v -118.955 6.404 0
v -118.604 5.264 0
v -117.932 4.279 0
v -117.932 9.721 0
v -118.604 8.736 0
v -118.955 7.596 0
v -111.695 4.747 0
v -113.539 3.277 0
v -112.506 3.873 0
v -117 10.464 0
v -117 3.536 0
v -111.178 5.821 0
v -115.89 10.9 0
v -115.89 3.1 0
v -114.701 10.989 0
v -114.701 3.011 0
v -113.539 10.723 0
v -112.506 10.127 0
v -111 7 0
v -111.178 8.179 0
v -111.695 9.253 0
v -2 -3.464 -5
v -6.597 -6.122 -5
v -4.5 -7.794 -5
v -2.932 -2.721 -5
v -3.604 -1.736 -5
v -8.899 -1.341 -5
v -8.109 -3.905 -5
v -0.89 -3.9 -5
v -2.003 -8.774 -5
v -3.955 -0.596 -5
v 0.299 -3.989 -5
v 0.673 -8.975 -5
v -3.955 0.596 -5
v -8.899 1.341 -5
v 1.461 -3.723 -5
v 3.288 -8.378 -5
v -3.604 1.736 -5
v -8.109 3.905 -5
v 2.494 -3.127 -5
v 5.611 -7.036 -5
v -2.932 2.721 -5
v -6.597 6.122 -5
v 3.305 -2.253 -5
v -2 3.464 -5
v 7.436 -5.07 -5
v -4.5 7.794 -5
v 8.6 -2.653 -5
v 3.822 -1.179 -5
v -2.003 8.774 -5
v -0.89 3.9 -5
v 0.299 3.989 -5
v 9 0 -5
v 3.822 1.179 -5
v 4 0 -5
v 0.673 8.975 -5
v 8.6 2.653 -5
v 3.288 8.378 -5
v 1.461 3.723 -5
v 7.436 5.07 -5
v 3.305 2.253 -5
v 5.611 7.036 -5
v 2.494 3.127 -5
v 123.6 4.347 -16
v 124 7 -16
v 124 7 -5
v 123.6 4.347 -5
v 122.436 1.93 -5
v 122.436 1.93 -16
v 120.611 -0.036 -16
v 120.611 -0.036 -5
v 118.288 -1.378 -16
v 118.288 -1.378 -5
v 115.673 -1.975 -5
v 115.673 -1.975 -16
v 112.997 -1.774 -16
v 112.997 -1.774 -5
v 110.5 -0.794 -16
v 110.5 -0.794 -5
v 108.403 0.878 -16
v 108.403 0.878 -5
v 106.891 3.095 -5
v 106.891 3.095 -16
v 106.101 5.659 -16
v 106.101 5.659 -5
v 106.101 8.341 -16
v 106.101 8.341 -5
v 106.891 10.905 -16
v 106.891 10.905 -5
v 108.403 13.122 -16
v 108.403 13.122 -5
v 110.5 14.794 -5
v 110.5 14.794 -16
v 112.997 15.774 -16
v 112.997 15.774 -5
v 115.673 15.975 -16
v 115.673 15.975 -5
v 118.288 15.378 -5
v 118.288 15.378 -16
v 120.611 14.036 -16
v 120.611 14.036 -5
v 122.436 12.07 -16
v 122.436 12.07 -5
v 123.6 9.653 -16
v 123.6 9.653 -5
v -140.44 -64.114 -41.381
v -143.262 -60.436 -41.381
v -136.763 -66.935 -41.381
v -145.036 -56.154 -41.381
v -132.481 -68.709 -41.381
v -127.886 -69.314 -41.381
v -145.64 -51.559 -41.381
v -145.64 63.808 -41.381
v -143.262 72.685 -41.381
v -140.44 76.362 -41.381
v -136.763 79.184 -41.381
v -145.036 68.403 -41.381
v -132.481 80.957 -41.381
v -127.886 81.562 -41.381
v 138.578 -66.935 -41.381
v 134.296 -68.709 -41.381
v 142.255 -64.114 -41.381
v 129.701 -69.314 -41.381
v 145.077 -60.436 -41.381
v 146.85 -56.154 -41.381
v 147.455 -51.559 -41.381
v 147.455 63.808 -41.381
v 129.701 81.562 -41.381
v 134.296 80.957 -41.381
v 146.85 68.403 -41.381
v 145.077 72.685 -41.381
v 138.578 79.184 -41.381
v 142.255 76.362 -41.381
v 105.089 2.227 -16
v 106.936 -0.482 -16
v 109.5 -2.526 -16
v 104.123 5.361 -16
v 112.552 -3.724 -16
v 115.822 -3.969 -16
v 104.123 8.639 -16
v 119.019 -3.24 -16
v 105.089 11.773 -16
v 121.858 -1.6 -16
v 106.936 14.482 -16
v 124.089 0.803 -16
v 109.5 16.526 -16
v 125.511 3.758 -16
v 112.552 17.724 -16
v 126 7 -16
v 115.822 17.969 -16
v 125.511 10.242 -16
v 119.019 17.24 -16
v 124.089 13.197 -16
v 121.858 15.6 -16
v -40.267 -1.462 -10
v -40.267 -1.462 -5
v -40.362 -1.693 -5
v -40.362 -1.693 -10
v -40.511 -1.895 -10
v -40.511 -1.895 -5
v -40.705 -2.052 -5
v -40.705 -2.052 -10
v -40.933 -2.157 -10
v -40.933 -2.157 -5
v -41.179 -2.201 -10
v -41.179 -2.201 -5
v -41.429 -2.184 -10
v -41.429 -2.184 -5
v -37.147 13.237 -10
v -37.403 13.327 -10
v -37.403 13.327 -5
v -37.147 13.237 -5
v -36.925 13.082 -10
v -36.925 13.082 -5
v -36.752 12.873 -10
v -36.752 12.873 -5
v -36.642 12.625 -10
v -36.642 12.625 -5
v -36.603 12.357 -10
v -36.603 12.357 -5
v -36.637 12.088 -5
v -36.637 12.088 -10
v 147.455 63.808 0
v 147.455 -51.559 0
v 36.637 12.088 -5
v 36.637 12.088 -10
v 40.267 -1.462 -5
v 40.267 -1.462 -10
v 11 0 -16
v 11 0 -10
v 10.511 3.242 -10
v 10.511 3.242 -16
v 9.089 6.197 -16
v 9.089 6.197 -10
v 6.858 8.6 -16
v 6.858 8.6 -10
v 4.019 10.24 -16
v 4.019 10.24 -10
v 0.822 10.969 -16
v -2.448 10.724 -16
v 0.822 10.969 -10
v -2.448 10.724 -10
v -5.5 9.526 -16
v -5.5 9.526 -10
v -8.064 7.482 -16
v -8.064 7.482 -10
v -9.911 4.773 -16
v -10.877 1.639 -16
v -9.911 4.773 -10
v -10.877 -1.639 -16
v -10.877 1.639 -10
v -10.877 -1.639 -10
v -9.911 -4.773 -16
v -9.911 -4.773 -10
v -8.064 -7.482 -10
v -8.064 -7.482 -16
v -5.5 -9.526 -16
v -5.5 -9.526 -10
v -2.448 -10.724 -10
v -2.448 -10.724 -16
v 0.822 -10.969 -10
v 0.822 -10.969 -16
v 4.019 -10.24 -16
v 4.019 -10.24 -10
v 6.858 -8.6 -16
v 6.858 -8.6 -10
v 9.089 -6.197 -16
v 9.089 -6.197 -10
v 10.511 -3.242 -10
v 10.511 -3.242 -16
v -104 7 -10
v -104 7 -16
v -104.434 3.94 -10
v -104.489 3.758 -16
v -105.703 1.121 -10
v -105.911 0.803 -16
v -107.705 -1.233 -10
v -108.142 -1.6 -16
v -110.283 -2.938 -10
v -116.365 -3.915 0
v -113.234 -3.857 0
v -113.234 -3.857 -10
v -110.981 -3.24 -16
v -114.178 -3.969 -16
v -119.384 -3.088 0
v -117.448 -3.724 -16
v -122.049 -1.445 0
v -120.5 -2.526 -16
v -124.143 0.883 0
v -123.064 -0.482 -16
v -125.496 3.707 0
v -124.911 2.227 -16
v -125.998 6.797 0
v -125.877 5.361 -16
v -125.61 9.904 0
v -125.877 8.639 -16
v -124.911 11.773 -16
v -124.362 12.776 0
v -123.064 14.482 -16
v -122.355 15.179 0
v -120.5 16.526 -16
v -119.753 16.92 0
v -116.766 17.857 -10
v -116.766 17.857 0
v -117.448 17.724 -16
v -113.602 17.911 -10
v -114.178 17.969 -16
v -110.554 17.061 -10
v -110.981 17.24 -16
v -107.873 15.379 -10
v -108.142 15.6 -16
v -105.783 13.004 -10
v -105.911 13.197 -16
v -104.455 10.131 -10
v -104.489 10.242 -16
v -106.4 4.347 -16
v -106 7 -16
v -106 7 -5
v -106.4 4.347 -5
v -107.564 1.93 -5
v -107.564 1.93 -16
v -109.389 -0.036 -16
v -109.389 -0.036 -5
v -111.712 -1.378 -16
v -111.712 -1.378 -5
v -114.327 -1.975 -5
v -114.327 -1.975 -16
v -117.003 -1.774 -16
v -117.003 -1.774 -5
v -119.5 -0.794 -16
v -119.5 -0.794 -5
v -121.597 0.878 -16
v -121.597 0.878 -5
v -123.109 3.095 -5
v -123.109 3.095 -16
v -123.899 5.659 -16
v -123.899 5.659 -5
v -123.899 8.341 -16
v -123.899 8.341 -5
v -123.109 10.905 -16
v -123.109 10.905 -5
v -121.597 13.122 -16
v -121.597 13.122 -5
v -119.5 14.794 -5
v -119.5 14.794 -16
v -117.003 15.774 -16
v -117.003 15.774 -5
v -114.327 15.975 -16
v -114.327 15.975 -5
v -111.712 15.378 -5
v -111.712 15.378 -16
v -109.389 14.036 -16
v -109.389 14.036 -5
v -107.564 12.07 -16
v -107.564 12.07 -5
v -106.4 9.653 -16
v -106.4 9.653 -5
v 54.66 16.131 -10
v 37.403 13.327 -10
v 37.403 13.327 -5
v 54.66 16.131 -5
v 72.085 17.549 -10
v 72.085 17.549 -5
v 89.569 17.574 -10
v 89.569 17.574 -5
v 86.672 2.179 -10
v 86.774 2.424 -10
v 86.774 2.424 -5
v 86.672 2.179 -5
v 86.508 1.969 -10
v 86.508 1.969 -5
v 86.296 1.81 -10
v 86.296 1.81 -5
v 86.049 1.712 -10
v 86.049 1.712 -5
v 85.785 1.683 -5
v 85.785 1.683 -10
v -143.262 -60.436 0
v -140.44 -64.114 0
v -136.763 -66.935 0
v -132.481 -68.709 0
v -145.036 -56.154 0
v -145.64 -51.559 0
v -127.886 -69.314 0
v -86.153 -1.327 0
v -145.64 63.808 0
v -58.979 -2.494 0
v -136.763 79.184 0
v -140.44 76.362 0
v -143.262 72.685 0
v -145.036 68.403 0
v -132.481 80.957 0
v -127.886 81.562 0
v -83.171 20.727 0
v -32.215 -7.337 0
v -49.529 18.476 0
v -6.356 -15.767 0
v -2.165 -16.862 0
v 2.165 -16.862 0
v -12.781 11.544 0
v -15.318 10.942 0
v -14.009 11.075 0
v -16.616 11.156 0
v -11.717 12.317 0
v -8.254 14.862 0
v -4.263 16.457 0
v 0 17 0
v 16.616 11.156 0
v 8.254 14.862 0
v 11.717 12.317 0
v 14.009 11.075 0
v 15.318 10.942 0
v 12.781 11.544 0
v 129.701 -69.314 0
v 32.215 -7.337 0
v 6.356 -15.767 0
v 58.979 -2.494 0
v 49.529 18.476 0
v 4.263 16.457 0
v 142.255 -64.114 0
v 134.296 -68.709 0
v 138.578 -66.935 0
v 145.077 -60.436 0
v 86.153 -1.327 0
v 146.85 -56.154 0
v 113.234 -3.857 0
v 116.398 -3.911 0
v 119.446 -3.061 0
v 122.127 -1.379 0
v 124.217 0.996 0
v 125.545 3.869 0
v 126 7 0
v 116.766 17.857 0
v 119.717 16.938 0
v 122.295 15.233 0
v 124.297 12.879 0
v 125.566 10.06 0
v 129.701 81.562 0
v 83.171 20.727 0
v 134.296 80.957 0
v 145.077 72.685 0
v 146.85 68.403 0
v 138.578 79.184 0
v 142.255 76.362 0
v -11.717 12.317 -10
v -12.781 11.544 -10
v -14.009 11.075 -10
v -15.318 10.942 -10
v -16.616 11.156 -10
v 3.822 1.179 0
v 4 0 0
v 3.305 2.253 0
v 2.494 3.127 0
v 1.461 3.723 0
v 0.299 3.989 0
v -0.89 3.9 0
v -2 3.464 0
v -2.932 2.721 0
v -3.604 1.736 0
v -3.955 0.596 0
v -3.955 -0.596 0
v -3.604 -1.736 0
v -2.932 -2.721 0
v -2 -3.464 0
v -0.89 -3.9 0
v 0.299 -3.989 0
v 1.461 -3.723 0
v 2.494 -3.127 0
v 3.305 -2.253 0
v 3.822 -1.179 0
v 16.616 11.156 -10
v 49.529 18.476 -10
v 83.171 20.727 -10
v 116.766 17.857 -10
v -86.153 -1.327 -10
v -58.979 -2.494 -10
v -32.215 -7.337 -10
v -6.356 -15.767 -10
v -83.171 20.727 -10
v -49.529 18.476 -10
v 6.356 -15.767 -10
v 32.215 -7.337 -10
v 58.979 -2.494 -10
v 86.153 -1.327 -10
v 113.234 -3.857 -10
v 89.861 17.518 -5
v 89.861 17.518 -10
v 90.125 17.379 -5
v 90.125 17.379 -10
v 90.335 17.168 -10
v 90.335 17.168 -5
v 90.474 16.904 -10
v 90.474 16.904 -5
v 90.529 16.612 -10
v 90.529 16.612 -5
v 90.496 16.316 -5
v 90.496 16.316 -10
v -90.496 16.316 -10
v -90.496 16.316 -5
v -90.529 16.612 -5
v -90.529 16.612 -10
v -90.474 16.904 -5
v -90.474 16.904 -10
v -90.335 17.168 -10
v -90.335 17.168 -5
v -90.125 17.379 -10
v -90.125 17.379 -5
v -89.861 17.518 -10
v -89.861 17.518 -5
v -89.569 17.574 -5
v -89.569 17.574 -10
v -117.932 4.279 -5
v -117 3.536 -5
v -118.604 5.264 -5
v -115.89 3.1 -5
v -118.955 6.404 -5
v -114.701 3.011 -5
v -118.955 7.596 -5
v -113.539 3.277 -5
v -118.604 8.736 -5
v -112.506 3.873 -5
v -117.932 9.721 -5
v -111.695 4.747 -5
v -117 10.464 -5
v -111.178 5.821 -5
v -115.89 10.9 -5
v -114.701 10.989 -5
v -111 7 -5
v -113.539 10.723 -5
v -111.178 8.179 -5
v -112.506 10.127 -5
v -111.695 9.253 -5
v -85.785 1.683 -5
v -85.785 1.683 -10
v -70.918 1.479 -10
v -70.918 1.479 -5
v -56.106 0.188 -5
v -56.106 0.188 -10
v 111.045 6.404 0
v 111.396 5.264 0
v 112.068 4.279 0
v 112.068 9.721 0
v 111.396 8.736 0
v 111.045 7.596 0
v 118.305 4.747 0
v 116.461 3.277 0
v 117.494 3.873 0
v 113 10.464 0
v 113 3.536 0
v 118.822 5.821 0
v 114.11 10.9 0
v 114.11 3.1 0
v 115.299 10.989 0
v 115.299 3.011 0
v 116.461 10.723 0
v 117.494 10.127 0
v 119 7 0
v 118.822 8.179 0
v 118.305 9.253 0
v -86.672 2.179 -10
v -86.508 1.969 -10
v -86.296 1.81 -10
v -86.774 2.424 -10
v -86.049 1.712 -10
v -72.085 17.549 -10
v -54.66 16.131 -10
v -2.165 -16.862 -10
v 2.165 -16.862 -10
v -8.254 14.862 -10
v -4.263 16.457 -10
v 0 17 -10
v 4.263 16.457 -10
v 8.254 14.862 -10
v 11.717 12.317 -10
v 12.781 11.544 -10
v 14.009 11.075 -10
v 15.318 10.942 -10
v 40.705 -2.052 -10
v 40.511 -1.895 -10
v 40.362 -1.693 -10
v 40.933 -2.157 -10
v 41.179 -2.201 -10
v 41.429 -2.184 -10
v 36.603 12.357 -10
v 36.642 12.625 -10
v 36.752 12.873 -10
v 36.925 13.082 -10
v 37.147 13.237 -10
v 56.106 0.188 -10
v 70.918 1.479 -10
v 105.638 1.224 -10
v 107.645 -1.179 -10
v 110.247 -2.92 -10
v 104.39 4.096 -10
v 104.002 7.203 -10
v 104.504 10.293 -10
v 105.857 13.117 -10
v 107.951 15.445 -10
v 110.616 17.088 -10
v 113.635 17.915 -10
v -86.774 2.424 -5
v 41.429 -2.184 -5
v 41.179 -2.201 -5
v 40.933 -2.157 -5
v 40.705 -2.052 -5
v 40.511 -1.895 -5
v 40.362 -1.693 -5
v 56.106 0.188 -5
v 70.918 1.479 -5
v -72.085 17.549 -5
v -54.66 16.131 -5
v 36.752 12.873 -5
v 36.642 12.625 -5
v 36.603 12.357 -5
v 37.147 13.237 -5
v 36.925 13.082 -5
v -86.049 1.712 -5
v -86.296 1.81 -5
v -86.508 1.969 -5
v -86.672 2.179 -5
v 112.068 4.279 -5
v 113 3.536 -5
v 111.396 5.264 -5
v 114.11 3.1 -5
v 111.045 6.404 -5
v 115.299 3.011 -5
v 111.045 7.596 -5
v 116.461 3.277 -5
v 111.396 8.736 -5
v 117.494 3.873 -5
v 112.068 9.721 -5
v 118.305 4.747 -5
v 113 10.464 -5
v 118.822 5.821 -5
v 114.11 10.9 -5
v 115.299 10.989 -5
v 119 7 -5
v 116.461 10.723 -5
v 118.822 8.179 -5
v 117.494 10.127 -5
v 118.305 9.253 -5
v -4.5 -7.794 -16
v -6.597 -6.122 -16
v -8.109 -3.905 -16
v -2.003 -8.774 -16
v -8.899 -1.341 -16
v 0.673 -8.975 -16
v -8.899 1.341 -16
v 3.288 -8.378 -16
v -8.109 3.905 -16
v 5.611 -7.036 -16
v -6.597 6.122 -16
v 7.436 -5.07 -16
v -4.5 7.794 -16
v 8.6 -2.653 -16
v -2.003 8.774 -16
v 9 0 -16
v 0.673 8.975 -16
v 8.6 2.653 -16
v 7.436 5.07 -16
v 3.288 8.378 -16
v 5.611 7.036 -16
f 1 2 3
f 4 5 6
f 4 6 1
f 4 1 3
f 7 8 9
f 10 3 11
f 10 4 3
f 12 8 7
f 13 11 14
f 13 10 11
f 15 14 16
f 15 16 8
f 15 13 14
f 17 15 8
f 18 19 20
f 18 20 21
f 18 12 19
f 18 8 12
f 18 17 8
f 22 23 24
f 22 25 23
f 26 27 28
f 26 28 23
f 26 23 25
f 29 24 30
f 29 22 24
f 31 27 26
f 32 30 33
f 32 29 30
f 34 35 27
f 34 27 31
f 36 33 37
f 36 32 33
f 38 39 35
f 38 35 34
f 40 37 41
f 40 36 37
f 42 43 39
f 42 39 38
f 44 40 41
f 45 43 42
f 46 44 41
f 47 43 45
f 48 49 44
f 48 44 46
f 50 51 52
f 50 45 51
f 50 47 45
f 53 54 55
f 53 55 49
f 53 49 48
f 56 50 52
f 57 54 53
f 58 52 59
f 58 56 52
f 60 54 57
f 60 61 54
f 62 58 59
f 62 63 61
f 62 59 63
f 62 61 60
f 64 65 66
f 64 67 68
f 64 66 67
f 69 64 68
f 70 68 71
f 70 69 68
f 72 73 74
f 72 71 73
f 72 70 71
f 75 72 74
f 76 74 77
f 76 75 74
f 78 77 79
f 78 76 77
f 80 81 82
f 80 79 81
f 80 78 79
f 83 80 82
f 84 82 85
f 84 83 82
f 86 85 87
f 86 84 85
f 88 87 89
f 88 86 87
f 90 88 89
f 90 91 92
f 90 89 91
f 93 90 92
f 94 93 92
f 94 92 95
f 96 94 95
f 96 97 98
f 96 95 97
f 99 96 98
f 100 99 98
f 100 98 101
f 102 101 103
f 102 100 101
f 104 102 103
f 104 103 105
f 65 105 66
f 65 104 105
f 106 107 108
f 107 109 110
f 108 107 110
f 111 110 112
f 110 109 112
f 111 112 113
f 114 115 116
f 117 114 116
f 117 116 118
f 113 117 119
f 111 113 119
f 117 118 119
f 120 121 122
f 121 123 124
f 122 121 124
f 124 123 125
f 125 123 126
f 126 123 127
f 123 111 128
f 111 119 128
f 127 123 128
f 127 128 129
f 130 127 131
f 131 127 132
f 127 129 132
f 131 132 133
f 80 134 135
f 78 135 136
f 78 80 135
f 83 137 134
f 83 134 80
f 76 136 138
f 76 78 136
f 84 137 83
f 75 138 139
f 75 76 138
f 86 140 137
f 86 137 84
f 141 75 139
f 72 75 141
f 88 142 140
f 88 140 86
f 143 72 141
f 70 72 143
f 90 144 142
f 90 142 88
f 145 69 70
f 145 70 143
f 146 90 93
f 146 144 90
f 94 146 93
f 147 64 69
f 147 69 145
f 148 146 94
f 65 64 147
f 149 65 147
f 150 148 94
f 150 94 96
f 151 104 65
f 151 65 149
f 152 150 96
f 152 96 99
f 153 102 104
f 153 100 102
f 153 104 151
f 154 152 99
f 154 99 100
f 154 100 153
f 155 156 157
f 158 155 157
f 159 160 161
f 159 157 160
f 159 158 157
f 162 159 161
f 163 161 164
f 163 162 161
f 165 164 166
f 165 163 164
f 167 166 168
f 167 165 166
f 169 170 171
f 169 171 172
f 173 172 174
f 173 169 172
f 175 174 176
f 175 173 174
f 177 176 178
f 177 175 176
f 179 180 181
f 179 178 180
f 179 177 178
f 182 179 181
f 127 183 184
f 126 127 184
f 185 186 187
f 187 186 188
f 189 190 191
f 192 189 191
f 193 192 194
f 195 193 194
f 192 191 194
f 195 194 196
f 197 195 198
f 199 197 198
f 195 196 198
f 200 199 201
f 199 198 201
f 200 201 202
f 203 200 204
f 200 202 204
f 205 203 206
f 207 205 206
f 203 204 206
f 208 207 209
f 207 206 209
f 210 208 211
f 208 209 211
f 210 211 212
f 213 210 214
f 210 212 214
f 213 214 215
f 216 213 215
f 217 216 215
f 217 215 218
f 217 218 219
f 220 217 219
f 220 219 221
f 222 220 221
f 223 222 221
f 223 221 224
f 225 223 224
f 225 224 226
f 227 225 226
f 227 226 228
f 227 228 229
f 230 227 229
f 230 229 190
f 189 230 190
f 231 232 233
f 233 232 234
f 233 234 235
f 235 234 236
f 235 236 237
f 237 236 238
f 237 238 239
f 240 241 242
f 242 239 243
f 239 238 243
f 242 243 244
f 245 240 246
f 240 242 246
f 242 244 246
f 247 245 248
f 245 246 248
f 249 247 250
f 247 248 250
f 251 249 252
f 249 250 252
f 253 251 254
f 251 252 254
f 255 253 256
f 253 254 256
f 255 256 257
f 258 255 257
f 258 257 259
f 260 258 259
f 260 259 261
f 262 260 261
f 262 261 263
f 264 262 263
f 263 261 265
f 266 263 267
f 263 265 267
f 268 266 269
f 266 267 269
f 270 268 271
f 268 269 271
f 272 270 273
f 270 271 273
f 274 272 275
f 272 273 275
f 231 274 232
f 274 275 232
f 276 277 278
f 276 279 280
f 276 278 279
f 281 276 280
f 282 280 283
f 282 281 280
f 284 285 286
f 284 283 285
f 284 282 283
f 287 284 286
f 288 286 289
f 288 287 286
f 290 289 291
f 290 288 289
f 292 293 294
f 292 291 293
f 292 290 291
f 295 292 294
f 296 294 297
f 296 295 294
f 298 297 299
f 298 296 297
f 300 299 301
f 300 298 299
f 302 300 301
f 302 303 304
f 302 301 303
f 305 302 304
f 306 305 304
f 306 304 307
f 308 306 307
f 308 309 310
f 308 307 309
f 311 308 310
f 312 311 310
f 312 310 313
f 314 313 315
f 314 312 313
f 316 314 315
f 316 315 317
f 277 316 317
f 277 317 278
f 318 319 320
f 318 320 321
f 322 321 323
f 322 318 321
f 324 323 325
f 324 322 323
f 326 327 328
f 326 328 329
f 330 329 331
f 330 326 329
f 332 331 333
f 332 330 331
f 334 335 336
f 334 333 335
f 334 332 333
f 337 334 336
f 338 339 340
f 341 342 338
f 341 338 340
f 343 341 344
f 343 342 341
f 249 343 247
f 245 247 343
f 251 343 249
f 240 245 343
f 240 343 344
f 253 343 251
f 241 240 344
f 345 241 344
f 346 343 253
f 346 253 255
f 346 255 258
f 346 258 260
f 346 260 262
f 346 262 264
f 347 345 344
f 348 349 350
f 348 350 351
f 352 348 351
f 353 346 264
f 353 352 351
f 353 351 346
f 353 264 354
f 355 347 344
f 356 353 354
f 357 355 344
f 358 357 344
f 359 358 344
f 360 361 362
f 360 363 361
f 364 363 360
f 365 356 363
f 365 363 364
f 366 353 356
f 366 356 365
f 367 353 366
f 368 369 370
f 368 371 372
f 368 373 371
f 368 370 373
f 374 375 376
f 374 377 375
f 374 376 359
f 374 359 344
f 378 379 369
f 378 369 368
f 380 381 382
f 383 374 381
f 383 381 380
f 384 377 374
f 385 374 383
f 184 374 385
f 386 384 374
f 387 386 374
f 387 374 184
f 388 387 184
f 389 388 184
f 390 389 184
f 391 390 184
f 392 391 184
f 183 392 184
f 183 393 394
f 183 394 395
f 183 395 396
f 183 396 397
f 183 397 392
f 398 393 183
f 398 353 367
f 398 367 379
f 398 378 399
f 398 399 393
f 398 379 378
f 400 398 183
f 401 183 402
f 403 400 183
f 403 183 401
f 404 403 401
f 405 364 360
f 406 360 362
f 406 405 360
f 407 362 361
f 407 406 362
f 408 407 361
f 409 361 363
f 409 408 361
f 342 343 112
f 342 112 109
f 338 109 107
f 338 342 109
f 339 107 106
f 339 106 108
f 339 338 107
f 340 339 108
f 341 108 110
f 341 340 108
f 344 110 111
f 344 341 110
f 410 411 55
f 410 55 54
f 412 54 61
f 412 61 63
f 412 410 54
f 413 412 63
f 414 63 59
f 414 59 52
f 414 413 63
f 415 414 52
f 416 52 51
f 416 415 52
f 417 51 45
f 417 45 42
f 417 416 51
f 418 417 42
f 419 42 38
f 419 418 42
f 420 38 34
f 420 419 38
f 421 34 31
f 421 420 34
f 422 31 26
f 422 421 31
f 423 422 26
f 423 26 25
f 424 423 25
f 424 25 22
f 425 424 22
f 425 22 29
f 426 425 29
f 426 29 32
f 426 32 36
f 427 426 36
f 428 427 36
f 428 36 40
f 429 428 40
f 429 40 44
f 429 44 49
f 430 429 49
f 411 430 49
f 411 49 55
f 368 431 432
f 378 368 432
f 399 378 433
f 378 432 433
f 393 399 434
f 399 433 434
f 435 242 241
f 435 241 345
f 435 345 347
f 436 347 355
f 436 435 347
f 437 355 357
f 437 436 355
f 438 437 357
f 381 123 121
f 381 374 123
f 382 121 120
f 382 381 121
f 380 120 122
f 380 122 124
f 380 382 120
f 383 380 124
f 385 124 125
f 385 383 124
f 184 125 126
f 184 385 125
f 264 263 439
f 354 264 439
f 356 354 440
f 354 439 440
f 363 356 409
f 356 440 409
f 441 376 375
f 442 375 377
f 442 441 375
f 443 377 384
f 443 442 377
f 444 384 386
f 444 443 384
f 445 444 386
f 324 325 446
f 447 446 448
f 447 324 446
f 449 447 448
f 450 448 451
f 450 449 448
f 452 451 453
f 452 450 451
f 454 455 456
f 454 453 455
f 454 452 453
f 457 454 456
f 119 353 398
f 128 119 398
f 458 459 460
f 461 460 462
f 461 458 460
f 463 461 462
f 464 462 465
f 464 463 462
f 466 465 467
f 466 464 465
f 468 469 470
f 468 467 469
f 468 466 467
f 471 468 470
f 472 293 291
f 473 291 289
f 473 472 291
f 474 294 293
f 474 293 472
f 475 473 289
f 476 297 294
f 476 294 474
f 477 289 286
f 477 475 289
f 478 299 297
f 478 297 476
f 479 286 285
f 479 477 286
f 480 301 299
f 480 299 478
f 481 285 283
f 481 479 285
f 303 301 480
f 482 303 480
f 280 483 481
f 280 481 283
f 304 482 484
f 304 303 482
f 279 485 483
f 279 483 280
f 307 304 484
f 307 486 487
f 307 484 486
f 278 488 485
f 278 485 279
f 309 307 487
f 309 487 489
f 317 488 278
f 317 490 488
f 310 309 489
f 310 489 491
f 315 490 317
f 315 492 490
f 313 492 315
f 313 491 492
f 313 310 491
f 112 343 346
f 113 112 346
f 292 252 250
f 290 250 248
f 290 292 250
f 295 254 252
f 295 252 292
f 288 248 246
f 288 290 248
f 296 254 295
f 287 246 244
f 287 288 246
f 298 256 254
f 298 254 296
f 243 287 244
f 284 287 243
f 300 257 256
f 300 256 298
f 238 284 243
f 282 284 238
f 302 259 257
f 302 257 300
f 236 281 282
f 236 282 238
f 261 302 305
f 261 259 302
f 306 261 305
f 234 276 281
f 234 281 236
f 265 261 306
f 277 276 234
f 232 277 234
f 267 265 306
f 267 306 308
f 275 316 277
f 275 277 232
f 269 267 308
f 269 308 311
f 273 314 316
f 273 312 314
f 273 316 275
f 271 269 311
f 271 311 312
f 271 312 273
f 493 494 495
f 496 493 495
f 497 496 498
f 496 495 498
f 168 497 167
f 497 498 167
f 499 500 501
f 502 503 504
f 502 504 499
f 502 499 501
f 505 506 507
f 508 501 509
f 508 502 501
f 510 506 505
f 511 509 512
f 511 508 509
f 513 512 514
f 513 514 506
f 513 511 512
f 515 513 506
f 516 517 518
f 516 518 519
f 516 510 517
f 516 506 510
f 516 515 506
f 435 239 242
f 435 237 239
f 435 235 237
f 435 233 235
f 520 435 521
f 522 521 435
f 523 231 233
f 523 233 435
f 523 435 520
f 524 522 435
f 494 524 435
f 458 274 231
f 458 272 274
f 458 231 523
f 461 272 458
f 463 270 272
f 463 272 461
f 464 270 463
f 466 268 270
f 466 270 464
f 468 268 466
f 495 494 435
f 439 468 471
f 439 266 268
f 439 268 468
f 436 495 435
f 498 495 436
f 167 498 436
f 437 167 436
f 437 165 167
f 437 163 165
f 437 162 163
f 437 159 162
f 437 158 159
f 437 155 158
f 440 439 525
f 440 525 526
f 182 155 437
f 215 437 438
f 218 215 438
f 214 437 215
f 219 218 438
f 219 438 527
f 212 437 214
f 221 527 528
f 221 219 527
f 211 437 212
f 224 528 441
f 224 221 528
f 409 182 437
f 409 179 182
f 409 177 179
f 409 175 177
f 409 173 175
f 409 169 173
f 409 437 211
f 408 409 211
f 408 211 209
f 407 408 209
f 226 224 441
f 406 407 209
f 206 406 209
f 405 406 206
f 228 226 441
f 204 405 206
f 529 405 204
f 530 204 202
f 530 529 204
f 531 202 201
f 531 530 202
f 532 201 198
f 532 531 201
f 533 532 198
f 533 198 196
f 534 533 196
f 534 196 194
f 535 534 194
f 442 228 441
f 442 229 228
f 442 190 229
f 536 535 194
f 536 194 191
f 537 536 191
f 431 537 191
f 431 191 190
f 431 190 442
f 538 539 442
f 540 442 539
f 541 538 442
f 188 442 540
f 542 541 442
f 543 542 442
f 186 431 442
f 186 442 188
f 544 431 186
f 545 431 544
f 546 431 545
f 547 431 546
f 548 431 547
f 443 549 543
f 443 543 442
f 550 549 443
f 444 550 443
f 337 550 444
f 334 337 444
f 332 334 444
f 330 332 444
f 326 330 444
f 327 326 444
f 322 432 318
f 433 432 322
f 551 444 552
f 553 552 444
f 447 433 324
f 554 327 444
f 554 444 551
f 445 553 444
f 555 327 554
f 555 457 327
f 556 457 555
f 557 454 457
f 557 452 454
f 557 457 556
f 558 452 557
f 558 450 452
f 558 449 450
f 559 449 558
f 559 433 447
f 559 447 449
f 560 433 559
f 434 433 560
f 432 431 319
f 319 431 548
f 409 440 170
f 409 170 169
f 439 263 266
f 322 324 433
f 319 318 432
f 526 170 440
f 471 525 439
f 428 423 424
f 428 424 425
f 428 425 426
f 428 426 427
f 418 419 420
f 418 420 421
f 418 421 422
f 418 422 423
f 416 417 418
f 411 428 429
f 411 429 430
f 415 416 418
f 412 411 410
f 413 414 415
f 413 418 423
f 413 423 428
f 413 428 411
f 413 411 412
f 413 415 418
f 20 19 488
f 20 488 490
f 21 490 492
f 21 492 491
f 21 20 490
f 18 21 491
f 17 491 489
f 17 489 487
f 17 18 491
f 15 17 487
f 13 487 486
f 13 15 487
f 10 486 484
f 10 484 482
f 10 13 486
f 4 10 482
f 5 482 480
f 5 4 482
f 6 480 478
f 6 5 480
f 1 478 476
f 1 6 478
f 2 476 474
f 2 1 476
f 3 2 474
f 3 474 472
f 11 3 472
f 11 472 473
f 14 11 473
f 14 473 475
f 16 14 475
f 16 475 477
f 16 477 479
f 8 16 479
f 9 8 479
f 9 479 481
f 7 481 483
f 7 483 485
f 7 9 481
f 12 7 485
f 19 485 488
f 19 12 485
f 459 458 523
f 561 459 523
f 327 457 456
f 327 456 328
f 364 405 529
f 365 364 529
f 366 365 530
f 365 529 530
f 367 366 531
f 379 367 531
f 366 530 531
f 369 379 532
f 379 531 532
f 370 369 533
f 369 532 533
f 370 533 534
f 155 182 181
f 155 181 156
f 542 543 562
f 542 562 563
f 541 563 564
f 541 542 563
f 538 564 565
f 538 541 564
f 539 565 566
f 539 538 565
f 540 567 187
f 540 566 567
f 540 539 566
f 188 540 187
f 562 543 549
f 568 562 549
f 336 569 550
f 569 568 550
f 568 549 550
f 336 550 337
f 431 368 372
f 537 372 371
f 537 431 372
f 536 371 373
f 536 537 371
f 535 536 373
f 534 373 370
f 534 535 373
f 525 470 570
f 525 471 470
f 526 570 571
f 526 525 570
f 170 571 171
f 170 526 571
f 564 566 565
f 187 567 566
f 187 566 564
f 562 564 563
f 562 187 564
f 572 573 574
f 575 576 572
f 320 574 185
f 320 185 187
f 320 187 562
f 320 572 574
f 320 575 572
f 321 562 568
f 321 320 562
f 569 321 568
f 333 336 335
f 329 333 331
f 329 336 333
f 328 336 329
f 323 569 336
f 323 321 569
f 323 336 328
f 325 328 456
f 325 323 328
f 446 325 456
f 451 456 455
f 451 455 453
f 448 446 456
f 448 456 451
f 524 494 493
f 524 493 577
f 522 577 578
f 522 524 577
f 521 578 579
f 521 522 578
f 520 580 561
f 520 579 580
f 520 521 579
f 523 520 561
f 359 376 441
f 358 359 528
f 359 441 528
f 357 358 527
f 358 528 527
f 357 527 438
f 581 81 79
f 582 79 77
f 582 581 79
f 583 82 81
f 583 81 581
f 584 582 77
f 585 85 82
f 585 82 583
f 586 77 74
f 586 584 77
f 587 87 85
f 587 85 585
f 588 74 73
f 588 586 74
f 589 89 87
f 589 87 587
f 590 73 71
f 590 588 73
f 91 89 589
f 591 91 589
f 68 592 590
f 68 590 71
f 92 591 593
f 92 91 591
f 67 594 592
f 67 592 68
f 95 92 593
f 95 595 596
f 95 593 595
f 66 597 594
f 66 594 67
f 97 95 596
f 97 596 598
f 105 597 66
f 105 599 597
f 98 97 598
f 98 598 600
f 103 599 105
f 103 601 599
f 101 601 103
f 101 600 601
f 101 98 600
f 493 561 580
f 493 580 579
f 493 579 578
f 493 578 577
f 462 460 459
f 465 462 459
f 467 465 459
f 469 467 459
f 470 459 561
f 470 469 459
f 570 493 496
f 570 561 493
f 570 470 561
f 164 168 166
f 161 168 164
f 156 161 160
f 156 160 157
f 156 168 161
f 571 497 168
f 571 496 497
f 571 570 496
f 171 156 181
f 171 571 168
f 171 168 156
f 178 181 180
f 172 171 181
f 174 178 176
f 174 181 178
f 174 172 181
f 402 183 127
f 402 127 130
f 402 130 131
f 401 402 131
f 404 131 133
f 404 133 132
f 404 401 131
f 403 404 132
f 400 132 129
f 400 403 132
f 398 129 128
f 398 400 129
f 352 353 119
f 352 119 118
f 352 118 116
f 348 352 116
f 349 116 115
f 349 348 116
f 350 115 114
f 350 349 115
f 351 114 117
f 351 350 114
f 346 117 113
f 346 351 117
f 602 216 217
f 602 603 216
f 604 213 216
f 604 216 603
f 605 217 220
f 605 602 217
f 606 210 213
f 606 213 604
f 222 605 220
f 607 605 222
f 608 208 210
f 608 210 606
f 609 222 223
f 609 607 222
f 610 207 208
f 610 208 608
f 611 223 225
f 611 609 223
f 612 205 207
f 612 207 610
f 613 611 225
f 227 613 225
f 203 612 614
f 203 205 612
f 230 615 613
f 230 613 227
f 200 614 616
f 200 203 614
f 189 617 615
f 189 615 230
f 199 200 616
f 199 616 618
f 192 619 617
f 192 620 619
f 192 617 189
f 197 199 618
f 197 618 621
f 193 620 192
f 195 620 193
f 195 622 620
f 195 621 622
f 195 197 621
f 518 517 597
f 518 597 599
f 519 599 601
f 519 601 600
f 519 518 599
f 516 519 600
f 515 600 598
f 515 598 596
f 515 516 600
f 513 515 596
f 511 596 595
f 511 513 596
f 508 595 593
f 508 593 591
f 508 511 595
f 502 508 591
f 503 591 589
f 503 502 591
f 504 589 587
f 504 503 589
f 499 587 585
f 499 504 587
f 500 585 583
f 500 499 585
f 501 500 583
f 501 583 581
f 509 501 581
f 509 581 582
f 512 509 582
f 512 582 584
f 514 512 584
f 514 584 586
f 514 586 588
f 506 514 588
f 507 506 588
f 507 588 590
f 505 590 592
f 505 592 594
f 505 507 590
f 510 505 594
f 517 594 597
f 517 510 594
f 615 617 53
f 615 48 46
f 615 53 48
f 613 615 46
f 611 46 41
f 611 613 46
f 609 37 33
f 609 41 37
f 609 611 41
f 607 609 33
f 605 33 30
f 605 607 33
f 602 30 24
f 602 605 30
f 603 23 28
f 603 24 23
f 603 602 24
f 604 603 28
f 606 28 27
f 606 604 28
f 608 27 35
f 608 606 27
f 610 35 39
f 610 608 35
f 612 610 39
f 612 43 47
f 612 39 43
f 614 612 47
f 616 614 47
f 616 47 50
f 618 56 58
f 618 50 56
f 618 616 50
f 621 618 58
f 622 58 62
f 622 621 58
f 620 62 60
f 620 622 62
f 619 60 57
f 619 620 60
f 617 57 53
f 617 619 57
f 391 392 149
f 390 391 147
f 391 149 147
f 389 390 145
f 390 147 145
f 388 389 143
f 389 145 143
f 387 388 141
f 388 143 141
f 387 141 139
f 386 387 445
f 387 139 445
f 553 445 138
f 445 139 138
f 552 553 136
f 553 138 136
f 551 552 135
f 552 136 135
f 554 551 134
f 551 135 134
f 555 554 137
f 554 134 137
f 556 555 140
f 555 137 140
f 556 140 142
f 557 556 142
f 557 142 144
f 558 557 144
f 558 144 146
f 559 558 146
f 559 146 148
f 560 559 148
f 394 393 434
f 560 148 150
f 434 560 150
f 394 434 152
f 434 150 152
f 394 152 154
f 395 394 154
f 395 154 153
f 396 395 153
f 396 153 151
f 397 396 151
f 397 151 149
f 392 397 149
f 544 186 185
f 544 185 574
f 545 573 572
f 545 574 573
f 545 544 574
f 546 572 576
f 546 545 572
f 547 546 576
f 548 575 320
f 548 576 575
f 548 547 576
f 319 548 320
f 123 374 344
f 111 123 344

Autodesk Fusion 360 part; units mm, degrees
sketch "Sketch1" plane through (0, 0, 0) normal (0, 0, 1) x (1, 0, 0)
  circle A0 centre (0, 0) radius 4
  circle A1 centre (0, 0) radius 9
  circle A2 centre (0, 0) radius 11
  circle A3 centre (115, 7) radius 4
  circle A4 centre (115, 7) radius 9
  arc A5 (113.2342, -3.8573) -> (6.3557, -15.7672) centre (81.1291, -201.2637) ccw
  circle A6 centre (115, 7) radius 11
  arc A7 (85.785, 1.6829) -> (41.4288, -2.1836) centre (81.1291, -201.2637) ccw
  arc A8 (89.5687, 17.5736) -> (37.4029, 13.3267) centre (81.1291, -201.2637) ccw
  arc A9 (116.7658, 17.8573) -> (16.6159, 11.1558) centre (81.1291, -201.2637) ccw
  line L0 (115, 7) -> (88, 7) construction
  line L1 (88, 7) -> (38, 7) construction
  line L2 (90.4961, 16.3156) -> (86.7738, 2.4238)
  line L3 (36.6367, 12.088) -> (40.2673, -1.4617)
  arc A10 (37.4029, 13.3267) -> (36.6367, 12.088) centre (37.6026, 12.3468) ccw
  arc A11 (40.2673, -1.4617) -> (41.4288, -2.1836) centre (41.2332, -1.2029) ccw
  arc A12 (90.4961, 16.3156) -> (89.5687, 17.5736) centre (89.5302, 16.5744) ccw
  arc A13 (85.785, 1.6829) -> (86.7738, 2.4238) centre (85.8079, 2.6827) ccw
  line L4 (0, 0) -> (0, -43.0721) construction
  circle A14 centre (-115, 7) radius 4
  arc A15 (-6.3557, -15.7672) -> (-113.2342, -3.8573) centre (-81.1291, -201.2637) ccw
  arc A16 (-16.6159, 11.1558) -> (-116.7658, 17.8573) centre (-81.1291, -201.2637) ccw
  arc A17 (-41.4288, -2.1836) -> (-85.785, 1.6829) centre (-81.1291, -201.2637) ccw
  arc A18 (-37.4029, 13.3267) -> (-89.5687, 17.5736) centre (-81.1291, -201.2637) ccw
  arc A19 (-89.5687, 17.5736) -> (-90.4961, 16.3156) centre (-89.5302, 16.5744) ccw
  circle A20 centre (-115, 7) radius 9
  arc A21 (-86.7738, 2.4238) -> (-85.785, 1.6829) centre (-85.8079, 2.6827) ccw
  line L5 (-115, 7) -> (-88, 7) construction
  line L6 (-36.6367, 12.088) -> (-40.2673, -1.4617)
  arc A22 (-41.4288, -2.1836) -> (-40.2673, -1.4617) centre (-41.2332, -1.2029) ccw
  circle A23 centre (-115, 7) radius 11
  line L7 (-90.4961, 16.3156) -> (-86.7738, 2.4238)
  arc A24 (-36.6367, 12.088) -> (-37.4029, 13.3267) centre (-37.6026, 12.3468) ccw
  line L8 (-88, 7) -> (-38, 7) construction
  arc A25 (-6.3557, -15.7672) -> (6.3557, -15.7672) centre (0, 0) ccw
  arc A26 (11.7168, 12.3173) -> (-11.7168, 12.3173) centre (0, 0) ccw
  arc A27 (-16.6159, 11.1558) -> (-11.7168, 12.3173) centre (-15.1629, 15.9401) ccw
  arc A28 (11.7168, 12.3173) -> (16.6159, 11.1558) centre (15.1629, 15.9401) ccw
  dimension "d1" = 18
  dimension "d2" = 22
  dimension "d3" = 18
  dimension "d5" = 34
  dimension "d14" = 8
  dimension "d15" = 22
  dimension "d16" = 8
  dimension "d17" = 7
  dimension "d18" = 115
  dimension "d19" = 200
  dimension "d23" = 27
  dimension "d24" = 50
  dimension "d25" = 75
  dimension "d26" = 75
  dimension "d27" = 1
  dimension "d28" = 1
  dimension "d29" = 1
  dimension "d30" = 1
  dimension "d31" = 3
  dimension "d32" = 3
  dimension "d33" = 5
  dimension "d34" = 5
extrude "Extrude1" add sketch "Sketch1" along normal mid plane 20 contours A5 A6 A9 A15 A16 A23 A25 A26 A27 A28 makes body 1
extrude "Extrude2" add sketch "Sketch1" along normal mid plane 10 contours A7 A8 L2 L3 A10 A11 A12 A13 | A17 A18 A19 A21 L6 A22 L7 A24 bodies 1
extrude "Extrude3" add sketch "Sketch1" along normal mid plane 32 contours A2 | A6 | A23 bodies 1
extrude "Extrude4" add sketch "Sketch1" along normal mid plane 10 contours A1 | A4 | A20 bodies 1
sketch "Sketch2" plane through (0, 0, 0) normal (0, 0, 1) x (1, 0, 0)
  line L0 (-127.8859, 81.5623) -> (129.7008, 81.5623)
  line L1 (147.4554, 63.8076) -> (147.4554, -51.5592)
  line L2 (129.7008, -69.3138) -> (-127.8859, -69.3138)
  line L3 (-145.6405, -51.5592) -> (-145.6405, 63.8076)
  arc A0 (-127.8859, 81.5623) -> (-145.6405, 63.8076) centre (-127.8859, 63.8076) ccw
  arc A1 (-145.6405, -51.5592) -> (-127.8859, -69.3138) centre (-127.8859, -51.5592) ccw
  arc A2 (129.7008, -69.3138) -> (147.4554, -51.5592) centre (129.7008, -51.5592) ccw
  arc A3 (147.4554, 63.8076) -> (129.7008, 81.5623) centre (129.7008, 63.8076) ccw
  dimension "d47" = 17.7546
extrude "Extrude5" add sketch "Sketch2" against normal blind 41.381 separate body makes body 2
combine "Combine1" operation cut target body 2 tool bodies 1
